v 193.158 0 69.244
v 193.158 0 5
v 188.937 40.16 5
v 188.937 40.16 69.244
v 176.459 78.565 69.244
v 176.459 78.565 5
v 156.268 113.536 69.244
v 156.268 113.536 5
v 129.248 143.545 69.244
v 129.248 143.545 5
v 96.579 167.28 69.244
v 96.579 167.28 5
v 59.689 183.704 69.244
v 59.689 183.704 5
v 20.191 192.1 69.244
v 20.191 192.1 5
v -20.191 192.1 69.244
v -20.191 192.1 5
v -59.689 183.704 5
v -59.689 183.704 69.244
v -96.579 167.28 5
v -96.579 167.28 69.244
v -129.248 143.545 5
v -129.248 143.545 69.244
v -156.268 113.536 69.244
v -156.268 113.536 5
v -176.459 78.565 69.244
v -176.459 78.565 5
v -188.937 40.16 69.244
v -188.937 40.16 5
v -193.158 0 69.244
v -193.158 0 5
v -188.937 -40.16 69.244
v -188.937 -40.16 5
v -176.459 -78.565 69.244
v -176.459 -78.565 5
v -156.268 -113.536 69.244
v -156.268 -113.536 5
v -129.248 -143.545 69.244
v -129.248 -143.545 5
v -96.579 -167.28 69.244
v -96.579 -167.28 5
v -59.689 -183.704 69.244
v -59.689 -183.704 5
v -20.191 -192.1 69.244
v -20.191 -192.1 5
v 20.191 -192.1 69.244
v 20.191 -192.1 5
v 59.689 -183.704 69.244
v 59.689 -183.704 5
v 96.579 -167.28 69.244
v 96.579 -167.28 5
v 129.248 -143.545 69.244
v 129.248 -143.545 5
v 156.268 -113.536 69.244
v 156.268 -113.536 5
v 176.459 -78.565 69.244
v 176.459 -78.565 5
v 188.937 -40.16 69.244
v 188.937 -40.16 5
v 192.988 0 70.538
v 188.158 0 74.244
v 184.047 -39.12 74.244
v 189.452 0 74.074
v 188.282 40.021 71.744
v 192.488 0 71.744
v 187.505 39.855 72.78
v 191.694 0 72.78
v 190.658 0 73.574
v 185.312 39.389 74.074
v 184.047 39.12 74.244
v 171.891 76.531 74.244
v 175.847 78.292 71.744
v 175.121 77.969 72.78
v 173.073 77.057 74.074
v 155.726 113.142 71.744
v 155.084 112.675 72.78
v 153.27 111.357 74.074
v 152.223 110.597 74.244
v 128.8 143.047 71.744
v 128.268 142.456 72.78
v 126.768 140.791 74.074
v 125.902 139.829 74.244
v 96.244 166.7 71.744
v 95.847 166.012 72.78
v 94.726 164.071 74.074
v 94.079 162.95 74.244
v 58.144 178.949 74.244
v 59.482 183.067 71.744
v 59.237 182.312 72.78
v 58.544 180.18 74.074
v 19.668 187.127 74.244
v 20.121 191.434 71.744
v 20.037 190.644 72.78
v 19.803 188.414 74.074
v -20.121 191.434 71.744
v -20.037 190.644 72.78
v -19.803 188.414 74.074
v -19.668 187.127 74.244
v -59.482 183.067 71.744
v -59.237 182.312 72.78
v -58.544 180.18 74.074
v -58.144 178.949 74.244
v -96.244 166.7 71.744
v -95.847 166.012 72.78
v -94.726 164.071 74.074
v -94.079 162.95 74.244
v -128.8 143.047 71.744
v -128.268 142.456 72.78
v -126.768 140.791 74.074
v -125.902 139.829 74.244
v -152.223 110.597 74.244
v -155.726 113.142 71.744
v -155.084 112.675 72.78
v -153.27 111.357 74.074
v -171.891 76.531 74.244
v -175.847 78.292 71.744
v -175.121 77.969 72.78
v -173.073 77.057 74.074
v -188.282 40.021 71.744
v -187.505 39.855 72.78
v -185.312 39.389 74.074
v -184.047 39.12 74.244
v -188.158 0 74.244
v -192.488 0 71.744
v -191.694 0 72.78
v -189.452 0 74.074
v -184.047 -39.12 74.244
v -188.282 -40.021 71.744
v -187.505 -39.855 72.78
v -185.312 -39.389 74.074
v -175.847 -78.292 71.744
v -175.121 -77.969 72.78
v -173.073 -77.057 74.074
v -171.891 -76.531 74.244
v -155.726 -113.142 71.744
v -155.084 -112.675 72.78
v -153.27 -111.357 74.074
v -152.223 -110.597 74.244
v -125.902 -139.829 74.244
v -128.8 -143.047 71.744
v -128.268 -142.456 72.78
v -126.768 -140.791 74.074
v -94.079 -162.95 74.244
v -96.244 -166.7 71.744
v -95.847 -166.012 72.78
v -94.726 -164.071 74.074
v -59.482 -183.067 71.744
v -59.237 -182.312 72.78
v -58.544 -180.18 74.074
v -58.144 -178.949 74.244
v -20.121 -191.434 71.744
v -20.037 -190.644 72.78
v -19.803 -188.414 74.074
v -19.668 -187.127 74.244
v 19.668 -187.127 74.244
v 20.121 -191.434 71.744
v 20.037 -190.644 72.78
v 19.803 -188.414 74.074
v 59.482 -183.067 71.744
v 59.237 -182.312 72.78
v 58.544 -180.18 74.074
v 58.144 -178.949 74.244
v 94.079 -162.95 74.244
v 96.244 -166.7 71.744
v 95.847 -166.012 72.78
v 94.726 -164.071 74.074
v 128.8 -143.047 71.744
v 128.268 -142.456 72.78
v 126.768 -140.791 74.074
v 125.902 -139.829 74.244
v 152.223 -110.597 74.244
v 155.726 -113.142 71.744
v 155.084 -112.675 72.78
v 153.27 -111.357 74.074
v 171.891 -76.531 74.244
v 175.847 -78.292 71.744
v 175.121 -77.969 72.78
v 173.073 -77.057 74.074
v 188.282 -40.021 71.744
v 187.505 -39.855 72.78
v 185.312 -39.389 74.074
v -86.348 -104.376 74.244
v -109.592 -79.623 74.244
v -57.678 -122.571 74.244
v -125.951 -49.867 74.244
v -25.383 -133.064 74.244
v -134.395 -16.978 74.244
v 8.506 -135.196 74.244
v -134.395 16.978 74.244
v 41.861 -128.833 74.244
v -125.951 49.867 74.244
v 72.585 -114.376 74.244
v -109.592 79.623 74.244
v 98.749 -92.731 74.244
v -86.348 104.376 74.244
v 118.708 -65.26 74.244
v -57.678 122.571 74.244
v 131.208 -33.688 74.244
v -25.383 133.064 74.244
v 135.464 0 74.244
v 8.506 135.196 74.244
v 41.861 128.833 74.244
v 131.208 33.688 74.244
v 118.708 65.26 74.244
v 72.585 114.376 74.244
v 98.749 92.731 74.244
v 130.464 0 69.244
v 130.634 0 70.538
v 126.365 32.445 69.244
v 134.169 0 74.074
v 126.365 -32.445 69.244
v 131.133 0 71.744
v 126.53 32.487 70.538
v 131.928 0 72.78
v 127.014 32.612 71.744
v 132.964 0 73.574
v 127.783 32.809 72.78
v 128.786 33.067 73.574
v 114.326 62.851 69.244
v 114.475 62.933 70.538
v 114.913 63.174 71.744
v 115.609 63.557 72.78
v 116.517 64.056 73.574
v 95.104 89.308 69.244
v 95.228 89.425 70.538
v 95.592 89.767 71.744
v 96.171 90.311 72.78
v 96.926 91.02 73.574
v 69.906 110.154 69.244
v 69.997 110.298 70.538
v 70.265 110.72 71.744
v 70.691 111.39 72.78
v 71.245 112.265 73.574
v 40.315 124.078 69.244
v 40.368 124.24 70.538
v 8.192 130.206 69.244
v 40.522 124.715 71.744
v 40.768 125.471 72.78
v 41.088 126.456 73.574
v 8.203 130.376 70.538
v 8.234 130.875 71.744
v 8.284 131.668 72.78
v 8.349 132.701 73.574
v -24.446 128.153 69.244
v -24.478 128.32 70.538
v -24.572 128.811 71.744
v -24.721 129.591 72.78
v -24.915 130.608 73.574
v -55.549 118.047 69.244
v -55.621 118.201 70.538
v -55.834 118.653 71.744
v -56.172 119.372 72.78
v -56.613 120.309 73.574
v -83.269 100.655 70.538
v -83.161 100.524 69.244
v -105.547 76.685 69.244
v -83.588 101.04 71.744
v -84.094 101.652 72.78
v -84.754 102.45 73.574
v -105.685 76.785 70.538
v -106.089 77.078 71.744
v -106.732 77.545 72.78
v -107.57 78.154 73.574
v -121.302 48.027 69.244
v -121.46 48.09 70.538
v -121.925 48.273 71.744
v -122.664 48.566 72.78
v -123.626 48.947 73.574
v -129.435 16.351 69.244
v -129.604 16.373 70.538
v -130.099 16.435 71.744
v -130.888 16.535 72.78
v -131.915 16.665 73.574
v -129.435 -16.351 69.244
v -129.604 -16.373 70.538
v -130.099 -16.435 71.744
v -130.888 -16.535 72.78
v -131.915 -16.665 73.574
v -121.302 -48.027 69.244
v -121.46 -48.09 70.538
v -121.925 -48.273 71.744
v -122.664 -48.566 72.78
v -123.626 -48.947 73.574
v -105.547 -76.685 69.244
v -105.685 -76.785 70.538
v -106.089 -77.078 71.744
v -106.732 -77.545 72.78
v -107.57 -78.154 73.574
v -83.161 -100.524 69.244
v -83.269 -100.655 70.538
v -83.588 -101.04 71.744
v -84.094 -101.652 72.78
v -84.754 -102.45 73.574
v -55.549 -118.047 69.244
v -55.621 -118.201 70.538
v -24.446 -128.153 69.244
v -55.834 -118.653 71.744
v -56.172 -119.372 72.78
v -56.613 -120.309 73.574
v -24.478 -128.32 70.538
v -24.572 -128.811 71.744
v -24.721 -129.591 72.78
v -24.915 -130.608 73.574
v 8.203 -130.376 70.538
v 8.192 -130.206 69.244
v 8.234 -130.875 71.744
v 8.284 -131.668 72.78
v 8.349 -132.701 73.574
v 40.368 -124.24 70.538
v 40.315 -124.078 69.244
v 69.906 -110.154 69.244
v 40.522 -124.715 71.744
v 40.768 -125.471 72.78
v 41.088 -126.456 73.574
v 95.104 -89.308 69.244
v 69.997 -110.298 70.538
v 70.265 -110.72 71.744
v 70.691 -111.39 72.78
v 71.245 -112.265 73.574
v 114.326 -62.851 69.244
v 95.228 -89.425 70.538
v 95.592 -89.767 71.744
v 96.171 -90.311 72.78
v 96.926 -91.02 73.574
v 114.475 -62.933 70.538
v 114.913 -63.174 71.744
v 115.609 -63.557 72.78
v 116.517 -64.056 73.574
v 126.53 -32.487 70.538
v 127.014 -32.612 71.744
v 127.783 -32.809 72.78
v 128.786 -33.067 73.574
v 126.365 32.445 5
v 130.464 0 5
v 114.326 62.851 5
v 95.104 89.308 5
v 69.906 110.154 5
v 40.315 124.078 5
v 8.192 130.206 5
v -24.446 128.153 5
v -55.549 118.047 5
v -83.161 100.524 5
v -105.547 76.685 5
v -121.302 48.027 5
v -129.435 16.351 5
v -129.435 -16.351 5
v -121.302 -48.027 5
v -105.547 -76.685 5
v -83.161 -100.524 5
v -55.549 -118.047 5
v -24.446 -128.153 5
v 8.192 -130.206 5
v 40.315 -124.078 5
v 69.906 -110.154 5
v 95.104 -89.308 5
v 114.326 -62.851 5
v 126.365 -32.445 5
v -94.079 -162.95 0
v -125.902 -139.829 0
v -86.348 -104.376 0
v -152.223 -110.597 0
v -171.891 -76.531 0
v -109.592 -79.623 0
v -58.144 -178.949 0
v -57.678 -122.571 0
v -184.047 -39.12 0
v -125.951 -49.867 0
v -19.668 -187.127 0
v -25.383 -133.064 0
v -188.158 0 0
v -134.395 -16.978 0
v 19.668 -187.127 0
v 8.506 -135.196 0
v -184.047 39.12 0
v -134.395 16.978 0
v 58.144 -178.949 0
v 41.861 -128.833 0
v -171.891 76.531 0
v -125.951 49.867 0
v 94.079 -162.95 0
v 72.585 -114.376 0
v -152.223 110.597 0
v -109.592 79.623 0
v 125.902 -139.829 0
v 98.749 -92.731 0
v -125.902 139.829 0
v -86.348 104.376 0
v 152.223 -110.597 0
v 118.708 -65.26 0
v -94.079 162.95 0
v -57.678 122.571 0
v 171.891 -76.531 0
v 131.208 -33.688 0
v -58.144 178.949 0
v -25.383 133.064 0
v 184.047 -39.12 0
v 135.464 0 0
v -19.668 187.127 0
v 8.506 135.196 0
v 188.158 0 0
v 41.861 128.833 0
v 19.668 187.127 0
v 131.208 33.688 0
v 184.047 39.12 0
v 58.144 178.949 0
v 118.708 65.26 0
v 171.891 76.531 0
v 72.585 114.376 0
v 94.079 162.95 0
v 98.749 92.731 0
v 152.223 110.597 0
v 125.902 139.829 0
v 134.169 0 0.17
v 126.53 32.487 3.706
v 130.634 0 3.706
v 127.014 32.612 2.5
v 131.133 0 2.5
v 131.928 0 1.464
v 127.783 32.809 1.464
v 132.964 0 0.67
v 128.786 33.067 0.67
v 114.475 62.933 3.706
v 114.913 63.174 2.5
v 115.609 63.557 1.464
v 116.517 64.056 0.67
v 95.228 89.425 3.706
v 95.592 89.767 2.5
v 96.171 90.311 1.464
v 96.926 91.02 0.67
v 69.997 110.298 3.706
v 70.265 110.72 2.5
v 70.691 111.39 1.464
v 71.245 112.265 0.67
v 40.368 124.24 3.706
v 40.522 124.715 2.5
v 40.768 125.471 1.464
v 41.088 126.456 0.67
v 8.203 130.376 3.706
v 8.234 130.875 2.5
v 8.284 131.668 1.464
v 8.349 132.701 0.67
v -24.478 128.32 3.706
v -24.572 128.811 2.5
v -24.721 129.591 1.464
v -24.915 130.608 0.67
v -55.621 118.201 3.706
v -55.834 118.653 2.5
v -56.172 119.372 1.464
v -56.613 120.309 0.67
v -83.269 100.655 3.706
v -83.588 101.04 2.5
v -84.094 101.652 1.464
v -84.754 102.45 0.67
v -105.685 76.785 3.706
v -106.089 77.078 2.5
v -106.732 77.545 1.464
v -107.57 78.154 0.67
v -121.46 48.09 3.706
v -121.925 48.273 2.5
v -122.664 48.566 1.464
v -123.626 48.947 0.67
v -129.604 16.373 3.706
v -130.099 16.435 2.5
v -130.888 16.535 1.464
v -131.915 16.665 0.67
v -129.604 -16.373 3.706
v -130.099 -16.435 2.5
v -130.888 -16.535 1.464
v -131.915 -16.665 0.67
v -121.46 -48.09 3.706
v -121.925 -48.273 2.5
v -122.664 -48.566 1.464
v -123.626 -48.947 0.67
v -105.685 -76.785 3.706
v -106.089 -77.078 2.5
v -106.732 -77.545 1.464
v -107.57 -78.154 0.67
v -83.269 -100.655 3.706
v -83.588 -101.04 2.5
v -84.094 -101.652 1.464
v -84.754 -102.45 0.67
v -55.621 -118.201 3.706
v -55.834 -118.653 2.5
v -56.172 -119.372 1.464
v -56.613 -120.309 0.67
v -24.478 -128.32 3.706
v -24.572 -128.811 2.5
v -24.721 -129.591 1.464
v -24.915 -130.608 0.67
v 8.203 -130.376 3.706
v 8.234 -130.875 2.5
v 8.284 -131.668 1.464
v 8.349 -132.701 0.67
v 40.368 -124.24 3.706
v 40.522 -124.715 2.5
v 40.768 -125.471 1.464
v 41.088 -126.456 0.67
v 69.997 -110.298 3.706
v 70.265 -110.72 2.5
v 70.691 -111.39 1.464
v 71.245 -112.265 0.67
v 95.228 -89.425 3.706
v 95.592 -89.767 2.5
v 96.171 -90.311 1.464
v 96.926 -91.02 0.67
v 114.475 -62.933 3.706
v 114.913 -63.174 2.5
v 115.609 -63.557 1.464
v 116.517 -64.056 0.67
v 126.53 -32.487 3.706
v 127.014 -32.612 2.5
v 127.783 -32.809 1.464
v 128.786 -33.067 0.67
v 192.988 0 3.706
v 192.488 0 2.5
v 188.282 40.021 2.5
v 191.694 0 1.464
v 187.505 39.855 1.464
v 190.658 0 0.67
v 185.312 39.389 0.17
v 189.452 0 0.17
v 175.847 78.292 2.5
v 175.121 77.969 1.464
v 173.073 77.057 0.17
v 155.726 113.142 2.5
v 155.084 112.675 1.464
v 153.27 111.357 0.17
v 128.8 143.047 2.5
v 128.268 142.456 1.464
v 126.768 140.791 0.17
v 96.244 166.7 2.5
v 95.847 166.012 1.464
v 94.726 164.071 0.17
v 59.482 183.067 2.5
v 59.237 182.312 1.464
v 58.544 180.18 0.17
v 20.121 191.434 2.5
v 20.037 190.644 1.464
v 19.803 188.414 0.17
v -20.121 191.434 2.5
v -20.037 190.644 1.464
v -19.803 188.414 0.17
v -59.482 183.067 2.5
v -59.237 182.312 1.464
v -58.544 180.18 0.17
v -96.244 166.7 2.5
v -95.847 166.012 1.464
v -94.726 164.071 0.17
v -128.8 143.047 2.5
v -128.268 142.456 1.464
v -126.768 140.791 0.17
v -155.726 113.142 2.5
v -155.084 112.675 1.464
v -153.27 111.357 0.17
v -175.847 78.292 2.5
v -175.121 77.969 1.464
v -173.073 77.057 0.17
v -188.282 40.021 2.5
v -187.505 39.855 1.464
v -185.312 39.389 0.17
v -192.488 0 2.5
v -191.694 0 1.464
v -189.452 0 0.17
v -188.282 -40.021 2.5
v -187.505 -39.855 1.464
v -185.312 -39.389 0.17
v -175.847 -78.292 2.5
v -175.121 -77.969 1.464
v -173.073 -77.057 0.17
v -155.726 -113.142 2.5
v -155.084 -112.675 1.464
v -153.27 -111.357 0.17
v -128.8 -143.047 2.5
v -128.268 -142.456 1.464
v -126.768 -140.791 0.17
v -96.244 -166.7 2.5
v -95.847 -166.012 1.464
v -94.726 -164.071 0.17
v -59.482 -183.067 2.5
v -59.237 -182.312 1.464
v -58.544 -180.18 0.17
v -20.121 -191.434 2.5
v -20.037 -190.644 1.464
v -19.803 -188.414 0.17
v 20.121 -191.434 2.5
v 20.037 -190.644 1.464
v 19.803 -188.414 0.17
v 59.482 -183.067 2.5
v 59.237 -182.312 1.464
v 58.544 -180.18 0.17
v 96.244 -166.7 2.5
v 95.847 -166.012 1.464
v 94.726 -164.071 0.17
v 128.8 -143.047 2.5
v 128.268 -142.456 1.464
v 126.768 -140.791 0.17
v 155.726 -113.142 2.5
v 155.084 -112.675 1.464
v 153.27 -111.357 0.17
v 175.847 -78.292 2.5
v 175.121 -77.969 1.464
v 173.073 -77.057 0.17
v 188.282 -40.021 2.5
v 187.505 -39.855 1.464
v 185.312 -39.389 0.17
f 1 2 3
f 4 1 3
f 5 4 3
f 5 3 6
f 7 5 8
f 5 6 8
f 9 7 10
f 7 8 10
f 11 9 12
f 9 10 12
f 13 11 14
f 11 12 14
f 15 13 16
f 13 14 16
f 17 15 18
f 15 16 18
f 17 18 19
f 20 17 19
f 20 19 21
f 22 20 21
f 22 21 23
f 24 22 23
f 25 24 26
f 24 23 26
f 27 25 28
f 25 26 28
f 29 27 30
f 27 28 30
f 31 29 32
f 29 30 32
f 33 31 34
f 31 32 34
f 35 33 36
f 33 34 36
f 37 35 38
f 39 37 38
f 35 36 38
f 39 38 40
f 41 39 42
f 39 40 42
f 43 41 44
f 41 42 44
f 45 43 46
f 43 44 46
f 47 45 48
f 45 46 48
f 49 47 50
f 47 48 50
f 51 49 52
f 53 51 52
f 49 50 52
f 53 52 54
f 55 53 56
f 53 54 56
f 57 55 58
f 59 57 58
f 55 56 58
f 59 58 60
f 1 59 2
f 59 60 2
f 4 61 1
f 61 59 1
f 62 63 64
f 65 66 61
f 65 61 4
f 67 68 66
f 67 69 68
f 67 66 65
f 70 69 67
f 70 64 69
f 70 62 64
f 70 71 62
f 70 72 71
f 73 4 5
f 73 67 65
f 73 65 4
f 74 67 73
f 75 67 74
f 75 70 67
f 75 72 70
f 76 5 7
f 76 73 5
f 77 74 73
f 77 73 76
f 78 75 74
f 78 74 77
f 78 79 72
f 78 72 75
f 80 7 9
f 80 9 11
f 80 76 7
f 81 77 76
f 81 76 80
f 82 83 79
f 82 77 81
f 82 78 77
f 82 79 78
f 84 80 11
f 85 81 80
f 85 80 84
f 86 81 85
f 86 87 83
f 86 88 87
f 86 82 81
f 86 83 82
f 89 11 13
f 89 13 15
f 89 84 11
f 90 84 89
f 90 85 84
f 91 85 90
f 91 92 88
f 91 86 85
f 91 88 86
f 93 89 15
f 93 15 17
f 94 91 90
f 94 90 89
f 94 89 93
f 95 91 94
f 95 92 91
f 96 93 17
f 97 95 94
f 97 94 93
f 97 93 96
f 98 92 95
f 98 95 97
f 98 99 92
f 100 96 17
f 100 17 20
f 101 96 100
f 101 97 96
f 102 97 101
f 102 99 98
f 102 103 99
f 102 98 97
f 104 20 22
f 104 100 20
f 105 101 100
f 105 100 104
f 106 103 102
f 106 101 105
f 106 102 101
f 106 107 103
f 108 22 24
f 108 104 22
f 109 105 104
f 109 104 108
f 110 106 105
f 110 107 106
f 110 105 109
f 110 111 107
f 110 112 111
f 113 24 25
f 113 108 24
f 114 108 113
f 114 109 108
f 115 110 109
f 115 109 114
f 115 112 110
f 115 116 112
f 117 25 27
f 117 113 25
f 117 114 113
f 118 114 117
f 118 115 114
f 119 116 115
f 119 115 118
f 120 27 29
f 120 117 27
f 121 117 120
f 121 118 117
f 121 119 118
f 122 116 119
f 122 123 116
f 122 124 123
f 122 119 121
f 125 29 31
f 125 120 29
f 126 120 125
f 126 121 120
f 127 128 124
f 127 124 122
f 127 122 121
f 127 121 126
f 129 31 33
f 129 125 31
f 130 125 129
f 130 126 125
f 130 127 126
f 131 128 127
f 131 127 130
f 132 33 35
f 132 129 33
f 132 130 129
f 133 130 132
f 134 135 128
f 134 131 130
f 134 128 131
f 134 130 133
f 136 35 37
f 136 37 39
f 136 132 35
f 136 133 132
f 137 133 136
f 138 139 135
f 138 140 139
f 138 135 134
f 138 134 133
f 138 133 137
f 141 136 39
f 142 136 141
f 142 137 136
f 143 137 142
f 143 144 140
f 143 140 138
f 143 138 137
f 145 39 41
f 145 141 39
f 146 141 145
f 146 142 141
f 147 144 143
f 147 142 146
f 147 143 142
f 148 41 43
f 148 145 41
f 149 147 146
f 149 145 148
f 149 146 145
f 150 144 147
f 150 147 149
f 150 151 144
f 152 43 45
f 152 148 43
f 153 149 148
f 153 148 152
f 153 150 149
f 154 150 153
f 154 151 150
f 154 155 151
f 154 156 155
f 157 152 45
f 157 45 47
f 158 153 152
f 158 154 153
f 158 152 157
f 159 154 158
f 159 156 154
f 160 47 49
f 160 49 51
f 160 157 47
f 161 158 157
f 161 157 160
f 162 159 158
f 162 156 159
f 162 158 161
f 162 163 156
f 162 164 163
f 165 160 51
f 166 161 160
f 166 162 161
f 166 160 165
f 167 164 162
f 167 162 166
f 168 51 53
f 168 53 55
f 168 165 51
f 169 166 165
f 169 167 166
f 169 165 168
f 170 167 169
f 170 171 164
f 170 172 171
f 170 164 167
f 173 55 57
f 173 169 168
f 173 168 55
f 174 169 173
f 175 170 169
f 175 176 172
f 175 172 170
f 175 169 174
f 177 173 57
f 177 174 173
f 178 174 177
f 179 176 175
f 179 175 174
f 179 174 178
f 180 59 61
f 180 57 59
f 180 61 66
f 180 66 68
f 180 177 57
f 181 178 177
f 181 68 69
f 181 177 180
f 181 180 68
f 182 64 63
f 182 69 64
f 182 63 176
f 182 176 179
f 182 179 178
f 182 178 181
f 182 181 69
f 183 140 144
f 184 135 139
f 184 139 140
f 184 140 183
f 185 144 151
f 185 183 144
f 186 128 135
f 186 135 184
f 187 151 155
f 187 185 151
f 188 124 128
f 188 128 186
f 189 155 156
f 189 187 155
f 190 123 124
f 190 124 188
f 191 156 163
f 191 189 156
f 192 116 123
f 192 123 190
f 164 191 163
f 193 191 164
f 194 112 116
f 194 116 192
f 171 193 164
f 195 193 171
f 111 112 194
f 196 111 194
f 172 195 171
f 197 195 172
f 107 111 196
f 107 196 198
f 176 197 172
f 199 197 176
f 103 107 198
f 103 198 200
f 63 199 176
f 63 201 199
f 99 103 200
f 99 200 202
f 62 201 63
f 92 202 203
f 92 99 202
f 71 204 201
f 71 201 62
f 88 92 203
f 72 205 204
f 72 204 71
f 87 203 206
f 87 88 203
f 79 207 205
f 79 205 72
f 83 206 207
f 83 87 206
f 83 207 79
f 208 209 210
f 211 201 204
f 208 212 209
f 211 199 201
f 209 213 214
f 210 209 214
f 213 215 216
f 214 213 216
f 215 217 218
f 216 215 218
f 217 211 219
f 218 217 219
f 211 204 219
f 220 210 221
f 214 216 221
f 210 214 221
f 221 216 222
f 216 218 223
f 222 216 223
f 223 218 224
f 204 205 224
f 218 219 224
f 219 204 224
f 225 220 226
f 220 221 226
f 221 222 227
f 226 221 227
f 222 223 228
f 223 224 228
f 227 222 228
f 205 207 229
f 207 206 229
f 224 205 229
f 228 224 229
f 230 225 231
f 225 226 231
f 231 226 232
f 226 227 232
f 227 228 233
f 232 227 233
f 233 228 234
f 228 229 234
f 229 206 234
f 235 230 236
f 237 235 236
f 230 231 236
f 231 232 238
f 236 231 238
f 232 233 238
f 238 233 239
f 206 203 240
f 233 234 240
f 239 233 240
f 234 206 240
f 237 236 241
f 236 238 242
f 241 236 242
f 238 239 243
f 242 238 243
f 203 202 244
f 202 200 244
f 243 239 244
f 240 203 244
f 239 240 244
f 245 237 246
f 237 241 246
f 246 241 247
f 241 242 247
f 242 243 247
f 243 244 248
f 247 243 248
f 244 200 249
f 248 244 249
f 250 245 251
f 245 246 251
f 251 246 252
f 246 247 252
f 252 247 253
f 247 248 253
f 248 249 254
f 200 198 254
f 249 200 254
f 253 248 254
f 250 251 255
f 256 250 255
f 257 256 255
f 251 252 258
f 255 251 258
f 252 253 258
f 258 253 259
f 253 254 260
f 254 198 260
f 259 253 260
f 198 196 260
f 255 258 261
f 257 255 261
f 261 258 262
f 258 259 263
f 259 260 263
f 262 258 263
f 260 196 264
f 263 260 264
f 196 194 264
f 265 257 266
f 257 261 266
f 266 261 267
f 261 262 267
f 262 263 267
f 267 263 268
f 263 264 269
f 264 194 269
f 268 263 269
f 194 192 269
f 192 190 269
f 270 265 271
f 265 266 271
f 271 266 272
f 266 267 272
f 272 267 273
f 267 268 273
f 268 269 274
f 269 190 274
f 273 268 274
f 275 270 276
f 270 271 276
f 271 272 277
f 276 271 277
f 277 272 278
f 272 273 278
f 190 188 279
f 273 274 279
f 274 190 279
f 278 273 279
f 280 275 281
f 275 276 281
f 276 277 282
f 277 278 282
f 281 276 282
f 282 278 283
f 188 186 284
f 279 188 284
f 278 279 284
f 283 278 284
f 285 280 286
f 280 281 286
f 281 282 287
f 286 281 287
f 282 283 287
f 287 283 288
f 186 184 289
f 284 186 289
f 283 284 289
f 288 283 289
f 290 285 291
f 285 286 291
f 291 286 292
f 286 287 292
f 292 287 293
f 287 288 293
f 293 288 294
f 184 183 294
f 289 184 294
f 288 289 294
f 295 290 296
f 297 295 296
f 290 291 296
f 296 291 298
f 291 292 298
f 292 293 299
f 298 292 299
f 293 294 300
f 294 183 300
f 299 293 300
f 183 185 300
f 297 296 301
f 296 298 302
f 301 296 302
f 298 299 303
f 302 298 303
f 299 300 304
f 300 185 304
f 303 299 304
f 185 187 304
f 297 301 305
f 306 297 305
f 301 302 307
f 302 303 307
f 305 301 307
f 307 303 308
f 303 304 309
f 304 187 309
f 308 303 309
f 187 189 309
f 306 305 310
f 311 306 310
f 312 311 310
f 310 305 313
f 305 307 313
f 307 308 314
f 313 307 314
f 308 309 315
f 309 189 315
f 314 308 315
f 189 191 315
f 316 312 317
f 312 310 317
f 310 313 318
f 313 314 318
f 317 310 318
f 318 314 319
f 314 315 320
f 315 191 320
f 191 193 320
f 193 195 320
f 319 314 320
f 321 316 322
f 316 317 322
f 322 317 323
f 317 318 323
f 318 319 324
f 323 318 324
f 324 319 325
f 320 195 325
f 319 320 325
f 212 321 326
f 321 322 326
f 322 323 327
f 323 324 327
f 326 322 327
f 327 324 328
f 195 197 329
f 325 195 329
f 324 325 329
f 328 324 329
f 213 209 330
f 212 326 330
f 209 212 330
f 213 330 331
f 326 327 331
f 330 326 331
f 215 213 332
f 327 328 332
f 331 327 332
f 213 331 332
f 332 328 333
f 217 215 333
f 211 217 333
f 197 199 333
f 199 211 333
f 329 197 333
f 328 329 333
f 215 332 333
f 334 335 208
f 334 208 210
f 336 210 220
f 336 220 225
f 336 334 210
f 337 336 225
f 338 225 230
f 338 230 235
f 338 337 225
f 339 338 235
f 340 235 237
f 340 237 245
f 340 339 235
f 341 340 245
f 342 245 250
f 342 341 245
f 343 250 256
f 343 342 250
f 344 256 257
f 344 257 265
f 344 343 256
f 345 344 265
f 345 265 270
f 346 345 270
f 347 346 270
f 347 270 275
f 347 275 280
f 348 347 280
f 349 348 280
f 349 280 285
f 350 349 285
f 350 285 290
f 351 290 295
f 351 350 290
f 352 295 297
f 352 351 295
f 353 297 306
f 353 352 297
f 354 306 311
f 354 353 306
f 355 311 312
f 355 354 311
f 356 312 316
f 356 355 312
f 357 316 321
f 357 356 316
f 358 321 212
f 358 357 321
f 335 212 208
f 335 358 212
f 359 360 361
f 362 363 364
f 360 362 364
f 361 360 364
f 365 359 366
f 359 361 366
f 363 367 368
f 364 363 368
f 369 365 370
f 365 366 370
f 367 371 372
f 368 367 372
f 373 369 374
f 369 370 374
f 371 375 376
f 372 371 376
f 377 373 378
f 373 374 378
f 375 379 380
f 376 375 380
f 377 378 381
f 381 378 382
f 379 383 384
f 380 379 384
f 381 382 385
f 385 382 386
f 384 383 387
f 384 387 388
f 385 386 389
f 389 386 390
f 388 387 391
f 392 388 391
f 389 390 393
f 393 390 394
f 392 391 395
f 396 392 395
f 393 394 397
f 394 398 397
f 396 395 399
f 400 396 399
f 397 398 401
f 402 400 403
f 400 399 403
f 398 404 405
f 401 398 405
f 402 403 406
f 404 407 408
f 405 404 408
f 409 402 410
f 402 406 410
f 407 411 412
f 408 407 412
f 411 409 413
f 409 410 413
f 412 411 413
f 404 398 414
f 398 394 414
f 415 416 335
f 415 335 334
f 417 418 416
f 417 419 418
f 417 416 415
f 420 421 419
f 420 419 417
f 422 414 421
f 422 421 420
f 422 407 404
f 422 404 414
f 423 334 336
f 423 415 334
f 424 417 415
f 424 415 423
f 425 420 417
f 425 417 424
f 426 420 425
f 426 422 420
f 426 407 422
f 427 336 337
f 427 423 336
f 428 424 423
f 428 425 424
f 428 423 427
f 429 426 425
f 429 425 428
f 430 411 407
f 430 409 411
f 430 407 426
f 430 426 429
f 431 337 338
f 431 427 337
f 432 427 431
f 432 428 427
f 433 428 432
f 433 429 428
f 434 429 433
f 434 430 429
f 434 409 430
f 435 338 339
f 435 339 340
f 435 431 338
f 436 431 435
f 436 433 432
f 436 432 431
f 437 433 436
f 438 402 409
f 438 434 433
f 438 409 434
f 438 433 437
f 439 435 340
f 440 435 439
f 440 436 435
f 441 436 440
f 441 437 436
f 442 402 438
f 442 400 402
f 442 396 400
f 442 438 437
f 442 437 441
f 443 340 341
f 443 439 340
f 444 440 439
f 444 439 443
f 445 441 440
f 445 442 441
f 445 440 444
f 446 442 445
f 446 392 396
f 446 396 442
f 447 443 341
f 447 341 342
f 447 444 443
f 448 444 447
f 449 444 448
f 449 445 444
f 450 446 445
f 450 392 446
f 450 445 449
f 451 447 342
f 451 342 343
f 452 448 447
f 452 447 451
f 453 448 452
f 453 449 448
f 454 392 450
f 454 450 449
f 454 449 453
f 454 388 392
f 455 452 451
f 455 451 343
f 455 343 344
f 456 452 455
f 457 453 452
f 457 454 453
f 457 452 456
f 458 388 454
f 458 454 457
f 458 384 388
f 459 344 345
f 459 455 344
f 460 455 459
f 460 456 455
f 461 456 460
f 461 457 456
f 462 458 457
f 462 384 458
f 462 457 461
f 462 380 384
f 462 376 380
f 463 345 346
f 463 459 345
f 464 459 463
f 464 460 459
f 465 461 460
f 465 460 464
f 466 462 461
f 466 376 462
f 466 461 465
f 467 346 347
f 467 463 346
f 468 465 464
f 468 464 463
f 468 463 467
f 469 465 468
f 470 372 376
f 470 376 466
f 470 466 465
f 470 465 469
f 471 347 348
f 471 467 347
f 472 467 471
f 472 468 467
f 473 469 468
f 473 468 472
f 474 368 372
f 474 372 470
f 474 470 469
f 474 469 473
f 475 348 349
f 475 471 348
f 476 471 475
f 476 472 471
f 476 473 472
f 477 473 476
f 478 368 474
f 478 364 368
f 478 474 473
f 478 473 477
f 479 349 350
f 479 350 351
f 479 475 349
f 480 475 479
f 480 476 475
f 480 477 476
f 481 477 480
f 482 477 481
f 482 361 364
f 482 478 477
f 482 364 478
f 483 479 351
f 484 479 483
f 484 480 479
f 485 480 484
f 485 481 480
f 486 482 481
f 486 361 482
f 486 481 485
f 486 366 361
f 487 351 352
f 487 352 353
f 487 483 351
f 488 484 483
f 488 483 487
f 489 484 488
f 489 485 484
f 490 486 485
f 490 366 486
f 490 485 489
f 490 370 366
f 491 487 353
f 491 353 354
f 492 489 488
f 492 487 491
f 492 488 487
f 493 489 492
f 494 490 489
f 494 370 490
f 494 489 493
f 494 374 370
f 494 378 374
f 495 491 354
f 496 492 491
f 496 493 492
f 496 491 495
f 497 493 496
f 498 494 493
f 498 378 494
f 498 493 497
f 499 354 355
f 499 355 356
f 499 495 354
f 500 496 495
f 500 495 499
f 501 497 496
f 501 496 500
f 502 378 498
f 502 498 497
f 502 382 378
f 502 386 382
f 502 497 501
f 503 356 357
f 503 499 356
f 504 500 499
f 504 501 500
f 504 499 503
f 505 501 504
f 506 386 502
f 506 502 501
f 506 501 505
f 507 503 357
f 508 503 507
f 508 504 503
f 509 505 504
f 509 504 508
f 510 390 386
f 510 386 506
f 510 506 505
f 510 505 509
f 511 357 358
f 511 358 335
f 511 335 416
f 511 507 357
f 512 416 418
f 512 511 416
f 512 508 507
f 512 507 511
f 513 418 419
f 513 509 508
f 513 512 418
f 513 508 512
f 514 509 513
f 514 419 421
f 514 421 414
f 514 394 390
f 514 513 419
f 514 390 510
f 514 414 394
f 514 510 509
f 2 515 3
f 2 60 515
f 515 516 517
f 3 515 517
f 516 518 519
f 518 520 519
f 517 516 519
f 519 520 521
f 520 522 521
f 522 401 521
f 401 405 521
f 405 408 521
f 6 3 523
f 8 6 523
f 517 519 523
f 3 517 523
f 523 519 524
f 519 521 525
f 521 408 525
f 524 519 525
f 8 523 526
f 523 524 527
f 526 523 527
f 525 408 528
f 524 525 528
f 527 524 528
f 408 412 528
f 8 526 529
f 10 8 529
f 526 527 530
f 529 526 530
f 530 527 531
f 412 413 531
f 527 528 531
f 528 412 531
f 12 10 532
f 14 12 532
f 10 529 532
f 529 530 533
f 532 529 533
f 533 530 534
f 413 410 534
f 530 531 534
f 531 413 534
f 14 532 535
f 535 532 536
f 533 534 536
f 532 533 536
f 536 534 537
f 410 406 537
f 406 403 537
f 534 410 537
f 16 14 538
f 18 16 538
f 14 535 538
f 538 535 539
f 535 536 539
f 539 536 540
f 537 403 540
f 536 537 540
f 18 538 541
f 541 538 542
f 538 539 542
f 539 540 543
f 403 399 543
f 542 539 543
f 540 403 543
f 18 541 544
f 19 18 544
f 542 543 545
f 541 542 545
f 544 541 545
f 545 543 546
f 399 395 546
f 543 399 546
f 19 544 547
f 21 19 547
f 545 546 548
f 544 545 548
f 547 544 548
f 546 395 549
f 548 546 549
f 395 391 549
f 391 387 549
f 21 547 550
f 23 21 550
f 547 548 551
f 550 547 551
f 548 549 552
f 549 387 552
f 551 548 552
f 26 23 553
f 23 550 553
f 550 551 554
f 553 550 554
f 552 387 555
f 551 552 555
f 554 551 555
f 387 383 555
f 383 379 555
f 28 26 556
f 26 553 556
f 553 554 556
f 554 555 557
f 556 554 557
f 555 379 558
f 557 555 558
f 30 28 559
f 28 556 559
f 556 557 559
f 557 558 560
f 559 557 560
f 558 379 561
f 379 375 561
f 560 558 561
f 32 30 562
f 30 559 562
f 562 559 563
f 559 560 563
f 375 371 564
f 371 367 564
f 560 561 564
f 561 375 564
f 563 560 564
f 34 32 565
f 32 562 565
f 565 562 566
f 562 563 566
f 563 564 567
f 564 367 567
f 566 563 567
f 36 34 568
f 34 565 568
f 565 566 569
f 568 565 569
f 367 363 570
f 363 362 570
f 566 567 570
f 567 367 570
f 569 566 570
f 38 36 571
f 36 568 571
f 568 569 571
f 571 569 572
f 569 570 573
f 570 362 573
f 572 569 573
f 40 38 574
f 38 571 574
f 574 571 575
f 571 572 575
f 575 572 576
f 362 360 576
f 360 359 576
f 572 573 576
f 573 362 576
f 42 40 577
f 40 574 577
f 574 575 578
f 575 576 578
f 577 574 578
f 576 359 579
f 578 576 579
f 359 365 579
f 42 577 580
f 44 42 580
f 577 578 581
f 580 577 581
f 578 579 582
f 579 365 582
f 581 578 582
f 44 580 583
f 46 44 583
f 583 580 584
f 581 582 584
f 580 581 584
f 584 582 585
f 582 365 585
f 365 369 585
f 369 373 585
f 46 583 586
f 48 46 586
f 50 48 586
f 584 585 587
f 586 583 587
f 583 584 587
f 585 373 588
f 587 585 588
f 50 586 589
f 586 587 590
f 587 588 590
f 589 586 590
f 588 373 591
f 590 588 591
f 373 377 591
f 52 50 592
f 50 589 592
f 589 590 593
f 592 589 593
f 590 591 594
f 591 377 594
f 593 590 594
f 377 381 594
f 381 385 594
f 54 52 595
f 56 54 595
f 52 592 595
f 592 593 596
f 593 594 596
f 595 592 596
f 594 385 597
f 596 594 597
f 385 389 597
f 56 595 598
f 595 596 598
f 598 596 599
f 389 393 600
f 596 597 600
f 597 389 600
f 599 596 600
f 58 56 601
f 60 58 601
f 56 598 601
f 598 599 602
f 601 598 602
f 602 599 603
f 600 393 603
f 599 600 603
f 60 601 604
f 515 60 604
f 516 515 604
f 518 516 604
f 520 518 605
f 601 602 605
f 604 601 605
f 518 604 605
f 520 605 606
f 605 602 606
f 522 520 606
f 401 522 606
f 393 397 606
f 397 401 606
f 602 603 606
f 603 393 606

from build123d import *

# Parameters (mm, degrees)
F0_R     = 193.1582177029
F0_R_2   = 191.8011573182
F0_R_3   = 130.4635260733
F1_DEPTH = 74.2441564798
F5_R     = 5


# Not quite as in the source:
# - the program builds the solid bodies; features that only make, move or delete a surface that nothing else refers to are left out


with BuildPart() as f1:
    # F0 (on Top) → F1 (new body)
    with BuildSketch(Plane.XY):
        Circle(F0_R)
        Circle(F0_R_2, mode=Mode.SUBTRACT)
        Circle(F0_R_2)
        Circle(F0_R_3, mode=Mode.SUBTRACT)
    extrude(amount=F1_DEPTH)

    # F5
    f5_edges = [f1.edges().sort_by_distance(p)[0] for p in [
        (-193.158218, 0, 74.244156),
        (-130.463526, 0, 0),
        (-193.158218, 0, 0),
        (-130.463526, 0, 74.244156),
    ]]
    fillet(f5_edges, radius=F5_R)


solid = f1.part
